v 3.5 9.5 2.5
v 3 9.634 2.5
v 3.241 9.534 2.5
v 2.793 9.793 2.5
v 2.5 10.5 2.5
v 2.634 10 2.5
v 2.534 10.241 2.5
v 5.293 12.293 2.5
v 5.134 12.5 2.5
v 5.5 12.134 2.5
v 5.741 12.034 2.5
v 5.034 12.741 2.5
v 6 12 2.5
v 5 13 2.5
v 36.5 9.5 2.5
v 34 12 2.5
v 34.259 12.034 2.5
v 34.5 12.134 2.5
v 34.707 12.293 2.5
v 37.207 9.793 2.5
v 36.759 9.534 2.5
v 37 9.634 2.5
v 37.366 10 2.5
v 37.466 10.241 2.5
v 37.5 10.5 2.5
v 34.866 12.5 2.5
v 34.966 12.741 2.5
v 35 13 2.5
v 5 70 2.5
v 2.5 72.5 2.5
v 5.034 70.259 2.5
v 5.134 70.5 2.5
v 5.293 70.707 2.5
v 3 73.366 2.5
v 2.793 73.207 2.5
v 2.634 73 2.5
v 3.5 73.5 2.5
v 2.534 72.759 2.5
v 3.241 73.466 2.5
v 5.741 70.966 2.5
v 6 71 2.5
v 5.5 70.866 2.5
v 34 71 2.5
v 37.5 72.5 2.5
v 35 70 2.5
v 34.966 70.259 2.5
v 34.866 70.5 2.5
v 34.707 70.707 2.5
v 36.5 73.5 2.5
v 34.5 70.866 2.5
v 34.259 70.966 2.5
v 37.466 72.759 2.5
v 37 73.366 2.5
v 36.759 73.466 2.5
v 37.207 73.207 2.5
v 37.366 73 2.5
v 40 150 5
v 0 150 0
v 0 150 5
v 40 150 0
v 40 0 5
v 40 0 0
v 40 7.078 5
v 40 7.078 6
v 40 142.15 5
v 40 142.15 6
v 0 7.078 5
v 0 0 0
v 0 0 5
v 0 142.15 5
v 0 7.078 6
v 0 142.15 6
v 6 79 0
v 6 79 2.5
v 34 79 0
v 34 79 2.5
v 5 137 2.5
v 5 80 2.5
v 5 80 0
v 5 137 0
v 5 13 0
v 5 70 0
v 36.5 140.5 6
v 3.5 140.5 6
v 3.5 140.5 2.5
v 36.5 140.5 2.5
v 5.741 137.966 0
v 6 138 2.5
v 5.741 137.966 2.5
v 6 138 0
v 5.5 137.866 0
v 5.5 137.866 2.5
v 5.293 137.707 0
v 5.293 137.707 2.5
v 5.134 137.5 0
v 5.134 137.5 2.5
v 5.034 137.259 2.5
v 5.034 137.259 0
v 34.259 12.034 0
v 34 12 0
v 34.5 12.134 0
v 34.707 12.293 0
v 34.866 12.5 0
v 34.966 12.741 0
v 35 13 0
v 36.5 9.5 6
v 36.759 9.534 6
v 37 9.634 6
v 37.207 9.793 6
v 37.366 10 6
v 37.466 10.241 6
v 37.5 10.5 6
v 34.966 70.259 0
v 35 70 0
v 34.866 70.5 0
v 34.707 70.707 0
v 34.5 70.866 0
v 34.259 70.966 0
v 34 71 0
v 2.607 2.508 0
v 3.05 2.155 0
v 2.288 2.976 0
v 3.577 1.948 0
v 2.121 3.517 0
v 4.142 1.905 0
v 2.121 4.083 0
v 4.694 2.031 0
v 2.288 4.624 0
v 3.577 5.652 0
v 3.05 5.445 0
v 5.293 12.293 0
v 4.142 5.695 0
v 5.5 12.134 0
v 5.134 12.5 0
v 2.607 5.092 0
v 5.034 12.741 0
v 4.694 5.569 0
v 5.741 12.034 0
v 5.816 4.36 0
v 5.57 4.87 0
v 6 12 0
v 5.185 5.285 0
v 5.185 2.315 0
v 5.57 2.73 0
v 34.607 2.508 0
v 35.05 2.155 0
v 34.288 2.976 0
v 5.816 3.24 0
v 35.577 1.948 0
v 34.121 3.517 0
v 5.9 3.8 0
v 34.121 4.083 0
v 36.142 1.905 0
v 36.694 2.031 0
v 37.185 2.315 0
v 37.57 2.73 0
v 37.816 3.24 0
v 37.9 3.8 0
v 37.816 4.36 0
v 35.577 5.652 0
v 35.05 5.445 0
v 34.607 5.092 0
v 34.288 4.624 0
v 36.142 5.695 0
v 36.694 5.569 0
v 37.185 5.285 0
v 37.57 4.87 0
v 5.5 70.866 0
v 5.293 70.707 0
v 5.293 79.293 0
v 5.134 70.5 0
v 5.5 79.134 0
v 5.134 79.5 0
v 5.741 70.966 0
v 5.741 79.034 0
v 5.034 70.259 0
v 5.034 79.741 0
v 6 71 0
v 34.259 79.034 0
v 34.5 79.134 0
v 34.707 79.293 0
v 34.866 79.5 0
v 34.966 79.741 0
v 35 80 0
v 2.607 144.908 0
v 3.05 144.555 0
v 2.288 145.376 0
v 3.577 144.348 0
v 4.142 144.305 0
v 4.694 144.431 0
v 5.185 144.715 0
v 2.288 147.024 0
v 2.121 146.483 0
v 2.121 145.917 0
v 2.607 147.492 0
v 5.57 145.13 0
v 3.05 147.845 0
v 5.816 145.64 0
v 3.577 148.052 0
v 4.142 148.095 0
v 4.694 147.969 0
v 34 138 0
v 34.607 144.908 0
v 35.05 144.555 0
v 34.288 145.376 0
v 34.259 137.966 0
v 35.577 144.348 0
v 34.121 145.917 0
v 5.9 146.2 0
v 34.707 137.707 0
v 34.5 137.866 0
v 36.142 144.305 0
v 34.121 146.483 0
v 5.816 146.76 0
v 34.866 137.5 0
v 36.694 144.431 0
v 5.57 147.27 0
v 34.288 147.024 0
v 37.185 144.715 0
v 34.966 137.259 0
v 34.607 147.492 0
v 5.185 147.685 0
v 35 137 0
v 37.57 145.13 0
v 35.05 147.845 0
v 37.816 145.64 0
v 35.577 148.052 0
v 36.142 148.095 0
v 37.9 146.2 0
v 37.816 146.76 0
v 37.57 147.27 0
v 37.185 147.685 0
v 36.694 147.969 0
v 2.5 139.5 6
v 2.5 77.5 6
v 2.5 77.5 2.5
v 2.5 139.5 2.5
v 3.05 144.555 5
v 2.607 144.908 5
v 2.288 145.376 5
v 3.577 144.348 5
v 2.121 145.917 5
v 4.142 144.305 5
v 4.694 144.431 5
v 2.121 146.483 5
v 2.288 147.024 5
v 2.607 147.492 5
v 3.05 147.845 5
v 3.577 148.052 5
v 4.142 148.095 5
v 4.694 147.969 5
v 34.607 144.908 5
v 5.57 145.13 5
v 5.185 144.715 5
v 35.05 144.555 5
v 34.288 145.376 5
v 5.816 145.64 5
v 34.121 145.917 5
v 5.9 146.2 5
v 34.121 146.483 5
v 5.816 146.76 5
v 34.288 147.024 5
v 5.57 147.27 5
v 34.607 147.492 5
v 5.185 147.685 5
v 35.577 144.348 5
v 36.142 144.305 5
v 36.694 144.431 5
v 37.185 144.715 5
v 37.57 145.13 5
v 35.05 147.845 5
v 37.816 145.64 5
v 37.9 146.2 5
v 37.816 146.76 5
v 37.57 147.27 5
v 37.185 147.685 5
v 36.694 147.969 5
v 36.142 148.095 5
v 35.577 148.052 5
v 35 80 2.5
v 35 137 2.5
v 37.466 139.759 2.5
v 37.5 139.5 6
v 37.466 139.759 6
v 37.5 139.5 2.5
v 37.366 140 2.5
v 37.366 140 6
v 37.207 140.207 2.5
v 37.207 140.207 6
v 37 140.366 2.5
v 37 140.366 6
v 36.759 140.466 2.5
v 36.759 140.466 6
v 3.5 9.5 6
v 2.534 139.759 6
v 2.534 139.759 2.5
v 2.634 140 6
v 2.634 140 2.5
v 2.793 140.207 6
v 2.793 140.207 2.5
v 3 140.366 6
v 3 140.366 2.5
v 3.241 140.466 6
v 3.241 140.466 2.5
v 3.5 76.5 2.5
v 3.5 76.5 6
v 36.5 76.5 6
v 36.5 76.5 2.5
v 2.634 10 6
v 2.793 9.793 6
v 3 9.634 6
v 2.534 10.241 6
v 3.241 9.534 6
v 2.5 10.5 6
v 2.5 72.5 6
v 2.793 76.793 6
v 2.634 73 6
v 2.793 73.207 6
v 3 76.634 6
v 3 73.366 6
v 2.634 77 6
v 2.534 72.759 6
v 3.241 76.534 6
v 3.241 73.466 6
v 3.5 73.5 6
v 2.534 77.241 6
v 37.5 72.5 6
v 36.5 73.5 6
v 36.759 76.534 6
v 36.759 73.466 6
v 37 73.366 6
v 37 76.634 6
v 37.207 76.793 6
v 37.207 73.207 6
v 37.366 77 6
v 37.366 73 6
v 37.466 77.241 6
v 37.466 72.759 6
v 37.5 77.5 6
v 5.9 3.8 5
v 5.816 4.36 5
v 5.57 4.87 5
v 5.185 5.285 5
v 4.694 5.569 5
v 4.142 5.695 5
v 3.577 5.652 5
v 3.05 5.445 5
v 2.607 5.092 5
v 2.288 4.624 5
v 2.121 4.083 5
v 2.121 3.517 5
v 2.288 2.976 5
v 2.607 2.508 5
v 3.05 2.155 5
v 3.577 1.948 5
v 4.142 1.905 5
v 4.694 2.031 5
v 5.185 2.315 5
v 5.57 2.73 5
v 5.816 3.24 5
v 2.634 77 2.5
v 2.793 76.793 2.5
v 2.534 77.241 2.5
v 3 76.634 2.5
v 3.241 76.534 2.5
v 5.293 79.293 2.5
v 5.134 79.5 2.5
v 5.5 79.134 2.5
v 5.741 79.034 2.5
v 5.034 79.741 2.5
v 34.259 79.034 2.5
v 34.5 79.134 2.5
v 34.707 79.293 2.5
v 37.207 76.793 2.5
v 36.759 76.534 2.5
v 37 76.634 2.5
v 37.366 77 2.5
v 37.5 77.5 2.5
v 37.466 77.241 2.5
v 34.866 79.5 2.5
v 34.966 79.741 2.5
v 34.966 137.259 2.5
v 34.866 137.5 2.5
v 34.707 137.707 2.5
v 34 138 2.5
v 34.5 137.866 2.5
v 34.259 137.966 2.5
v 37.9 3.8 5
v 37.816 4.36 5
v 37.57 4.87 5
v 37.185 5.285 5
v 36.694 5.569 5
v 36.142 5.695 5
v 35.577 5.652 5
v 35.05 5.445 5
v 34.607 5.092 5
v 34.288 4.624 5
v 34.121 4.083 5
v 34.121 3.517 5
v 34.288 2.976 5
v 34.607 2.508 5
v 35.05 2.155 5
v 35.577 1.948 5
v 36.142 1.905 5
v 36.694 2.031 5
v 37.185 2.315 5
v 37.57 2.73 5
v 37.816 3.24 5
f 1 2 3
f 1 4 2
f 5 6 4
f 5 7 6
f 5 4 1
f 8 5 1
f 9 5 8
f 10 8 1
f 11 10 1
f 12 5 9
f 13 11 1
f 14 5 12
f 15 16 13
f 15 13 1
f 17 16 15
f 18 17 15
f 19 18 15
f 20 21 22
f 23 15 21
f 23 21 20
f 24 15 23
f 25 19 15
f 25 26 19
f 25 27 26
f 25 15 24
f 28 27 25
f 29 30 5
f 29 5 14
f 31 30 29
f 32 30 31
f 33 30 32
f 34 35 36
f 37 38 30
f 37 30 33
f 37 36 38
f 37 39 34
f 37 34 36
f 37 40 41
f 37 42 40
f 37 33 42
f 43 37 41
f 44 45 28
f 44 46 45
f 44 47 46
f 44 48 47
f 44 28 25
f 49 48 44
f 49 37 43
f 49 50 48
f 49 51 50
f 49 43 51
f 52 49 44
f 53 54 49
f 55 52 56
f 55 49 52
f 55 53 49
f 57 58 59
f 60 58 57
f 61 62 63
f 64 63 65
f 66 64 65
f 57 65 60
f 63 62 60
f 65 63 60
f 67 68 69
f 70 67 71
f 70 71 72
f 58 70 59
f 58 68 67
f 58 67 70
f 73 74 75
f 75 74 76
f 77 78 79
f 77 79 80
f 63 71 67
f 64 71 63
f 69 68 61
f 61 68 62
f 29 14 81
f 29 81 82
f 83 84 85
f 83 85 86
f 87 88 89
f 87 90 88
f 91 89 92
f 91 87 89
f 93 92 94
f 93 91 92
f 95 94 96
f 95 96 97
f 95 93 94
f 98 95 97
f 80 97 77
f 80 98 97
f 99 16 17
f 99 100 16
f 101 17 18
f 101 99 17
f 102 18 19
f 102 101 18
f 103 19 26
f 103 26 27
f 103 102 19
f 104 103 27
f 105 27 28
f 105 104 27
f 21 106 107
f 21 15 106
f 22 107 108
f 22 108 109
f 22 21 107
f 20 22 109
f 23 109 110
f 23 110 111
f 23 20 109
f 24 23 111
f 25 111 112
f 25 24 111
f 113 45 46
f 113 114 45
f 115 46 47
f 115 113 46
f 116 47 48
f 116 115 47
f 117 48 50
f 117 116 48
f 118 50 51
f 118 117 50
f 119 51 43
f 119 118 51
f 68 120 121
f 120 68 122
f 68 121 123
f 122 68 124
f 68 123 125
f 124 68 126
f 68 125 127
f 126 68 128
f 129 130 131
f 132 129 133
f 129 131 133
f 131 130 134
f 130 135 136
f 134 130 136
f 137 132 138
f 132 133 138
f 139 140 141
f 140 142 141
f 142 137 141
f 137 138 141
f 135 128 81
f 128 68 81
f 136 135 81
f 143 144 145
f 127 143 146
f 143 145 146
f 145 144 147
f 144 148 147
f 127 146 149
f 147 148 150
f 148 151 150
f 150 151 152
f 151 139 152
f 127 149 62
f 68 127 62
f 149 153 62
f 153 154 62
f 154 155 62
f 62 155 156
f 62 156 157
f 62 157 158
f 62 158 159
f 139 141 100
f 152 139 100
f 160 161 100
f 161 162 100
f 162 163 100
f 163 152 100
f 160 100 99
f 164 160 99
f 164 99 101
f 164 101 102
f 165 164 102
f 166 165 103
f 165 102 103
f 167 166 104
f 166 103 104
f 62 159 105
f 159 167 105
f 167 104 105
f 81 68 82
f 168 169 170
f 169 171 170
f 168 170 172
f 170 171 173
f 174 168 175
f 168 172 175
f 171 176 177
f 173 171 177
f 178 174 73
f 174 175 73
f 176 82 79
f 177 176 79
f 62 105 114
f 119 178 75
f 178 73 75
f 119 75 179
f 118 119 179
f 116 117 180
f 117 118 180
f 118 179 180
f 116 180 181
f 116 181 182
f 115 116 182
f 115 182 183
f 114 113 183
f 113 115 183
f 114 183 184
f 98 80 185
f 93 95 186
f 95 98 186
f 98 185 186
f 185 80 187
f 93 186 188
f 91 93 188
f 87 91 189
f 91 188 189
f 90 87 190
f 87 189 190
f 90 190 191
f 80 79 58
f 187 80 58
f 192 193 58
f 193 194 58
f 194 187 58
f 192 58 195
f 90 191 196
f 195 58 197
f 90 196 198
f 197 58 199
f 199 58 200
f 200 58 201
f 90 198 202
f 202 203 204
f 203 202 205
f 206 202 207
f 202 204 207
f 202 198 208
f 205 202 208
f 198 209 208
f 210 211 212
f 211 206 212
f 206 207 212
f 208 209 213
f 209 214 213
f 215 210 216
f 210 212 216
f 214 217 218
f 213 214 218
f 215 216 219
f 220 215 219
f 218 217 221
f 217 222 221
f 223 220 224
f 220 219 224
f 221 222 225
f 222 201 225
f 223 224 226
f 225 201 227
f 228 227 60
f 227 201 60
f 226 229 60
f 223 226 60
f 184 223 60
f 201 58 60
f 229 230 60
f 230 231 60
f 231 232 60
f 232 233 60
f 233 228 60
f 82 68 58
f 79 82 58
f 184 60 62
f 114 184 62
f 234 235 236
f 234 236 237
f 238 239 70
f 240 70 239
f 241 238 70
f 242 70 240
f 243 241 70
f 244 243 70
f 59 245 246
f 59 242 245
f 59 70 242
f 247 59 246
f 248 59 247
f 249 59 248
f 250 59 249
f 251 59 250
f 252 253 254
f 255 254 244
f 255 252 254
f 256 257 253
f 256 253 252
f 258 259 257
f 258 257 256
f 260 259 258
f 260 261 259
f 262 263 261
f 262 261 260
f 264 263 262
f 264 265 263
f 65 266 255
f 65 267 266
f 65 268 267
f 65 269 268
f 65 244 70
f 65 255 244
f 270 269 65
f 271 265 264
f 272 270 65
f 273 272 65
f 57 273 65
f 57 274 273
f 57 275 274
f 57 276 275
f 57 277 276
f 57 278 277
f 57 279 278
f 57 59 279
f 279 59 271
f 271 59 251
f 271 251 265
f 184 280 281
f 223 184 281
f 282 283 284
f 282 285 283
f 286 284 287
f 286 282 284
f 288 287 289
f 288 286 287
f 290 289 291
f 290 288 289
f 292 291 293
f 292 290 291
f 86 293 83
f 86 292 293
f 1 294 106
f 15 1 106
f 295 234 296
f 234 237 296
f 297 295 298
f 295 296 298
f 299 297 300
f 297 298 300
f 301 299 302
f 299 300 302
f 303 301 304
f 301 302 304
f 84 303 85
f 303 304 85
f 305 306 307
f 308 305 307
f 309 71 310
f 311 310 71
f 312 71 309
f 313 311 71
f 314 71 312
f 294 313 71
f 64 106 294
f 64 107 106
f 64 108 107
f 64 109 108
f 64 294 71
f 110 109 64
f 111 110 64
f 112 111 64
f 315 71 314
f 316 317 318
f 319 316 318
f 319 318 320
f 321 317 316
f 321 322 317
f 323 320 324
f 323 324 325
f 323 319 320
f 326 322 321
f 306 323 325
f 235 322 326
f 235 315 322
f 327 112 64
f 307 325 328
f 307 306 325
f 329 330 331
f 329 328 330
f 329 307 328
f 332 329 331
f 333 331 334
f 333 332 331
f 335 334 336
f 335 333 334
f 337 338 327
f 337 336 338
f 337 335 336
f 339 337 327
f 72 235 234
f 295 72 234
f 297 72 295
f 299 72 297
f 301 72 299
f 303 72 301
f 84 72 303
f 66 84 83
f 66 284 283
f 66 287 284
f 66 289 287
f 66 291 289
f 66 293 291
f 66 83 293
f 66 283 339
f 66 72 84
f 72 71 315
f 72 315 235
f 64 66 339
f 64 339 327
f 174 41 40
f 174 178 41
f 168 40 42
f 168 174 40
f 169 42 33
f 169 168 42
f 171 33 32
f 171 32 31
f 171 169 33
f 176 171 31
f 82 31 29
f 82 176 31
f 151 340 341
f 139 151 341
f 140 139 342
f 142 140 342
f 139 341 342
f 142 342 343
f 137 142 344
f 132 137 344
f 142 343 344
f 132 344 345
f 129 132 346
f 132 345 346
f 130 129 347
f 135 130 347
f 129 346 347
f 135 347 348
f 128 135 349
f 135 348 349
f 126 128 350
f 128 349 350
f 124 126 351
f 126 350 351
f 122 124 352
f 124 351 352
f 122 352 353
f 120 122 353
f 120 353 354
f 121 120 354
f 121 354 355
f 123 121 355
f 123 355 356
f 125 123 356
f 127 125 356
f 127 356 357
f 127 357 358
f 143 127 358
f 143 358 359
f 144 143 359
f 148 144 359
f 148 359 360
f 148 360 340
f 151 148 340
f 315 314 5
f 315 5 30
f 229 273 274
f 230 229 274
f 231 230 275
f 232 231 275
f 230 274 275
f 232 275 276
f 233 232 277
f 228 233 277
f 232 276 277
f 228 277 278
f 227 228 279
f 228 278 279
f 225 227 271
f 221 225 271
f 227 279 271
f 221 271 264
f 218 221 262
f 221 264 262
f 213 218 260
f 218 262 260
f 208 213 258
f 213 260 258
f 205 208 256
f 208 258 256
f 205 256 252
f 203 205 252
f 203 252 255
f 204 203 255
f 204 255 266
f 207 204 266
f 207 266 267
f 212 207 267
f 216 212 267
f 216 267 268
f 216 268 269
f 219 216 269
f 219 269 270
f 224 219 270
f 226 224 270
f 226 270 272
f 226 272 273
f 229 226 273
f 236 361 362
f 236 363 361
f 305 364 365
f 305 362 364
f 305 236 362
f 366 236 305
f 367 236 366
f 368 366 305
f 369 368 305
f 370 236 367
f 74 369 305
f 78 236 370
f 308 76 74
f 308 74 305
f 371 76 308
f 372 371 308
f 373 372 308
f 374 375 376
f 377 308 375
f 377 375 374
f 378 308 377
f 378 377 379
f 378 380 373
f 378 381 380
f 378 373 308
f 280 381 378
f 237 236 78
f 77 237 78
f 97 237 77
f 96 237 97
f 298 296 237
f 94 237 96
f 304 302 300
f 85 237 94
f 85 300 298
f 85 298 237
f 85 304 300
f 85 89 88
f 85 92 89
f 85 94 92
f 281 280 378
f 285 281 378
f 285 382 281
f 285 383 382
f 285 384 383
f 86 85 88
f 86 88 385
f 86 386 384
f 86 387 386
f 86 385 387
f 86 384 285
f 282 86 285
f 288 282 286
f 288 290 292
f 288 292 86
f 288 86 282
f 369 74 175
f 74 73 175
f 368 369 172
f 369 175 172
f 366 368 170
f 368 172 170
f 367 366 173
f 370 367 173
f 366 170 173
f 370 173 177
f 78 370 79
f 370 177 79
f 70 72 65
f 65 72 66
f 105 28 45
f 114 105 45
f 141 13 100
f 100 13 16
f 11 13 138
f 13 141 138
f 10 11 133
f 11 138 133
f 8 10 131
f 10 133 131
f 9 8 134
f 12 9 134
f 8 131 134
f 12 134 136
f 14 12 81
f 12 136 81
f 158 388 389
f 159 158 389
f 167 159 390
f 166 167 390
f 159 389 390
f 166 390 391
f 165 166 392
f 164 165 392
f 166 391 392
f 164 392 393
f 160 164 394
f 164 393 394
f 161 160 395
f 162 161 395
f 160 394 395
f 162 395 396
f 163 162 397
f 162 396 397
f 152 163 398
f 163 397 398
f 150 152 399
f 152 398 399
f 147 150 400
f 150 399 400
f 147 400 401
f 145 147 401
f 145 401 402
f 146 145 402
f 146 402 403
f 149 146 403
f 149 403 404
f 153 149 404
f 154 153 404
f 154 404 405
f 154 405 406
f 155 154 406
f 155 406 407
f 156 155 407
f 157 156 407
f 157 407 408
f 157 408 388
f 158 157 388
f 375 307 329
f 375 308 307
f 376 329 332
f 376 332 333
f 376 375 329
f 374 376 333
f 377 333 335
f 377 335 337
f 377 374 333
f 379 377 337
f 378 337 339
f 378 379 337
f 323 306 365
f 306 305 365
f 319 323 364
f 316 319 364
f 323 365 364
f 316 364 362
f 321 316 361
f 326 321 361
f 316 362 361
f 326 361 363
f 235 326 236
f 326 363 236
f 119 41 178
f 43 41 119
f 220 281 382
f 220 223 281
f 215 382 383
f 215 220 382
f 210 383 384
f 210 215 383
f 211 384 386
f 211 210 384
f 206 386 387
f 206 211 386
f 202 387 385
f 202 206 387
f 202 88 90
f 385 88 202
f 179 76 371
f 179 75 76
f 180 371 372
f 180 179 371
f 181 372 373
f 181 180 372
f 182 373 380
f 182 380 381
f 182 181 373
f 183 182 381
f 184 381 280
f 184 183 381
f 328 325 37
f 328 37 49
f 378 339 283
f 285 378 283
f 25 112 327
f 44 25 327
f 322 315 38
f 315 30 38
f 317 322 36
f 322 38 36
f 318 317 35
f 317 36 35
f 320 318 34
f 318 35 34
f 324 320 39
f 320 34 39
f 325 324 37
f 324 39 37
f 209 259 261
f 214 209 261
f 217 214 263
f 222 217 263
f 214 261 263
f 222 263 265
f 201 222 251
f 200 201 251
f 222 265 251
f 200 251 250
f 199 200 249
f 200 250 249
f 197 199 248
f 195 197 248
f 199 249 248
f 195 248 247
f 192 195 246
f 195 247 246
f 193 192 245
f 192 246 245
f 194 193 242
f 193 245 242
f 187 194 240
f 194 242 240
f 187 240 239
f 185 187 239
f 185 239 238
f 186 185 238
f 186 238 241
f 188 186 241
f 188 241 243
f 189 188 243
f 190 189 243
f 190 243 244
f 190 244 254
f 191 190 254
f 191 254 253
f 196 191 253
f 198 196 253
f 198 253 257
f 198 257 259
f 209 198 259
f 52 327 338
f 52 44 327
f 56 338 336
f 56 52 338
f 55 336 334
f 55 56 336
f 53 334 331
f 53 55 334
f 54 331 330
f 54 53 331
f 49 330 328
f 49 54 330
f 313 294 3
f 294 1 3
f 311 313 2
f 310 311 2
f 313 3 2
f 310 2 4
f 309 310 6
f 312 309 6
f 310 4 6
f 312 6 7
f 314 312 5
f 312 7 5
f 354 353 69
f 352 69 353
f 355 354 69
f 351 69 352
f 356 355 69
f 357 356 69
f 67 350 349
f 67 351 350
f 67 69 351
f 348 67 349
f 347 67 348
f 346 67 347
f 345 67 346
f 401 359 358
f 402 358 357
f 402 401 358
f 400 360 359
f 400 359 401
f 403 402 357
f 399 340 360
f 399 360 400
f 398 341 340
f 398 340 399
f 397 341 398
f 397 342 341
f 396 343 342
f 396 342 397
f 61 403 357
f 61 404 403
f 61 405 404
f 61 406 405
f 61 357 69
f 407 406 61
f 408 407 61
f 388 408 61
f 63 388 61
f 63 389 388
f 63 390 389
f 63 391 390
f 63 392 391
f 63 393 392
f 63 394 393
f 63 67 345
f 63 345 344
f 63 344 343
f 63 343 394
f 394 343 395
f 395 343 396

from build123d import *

# Parameters (mm, degrees)
SKETCH_1_W          = 40
SKETCH_1_H          = 150
EXTRUDE_1_DEPTH     = 6
SKETCH_2_R          = 1.9
CUT_EXTRUDE_1_DEPTH = 156.357651888
SKETCH_3_W          = 30
SKETCH_3_H          = 59
CUT_EXTRUDE_2_DEPTH = 156.357651888
SKETCH_4_W          = 35
SKETCH_4_H          = 64
CUT_EXTRUDE_3_DEPTH = 3.5
SKETCH_5_W          = 40
SKETCH_5_H          = 7.078158815
SKETCH_5_H_2        = 7.85
CUT_EXTRUDE_4_DEPTH = 1
FILLET_1_R          = 1


with BuildPart() as part:
    # ｽｹｯﾁ1 → ﾎﾞｽ - 押し出し1 (new body)
    with BuildSketch(Plane.XY):
        with Locations((20, 75)):
            Rectangle(SKETCH_1_W, SKETCH_1_H)
    extrude(amount=EXTRUDE_1_DEPTH)

    # ｽｹｯﾁ2 → ｶｯﾄ - 押し出し1 (cut, through all)
    with BuildSketch(Plane.XY.offset(6)):
        with Locations((36, 146.2)):
            Circle(SKETCH_2_R)
        with Locations((4, 146.2)):
            Circle(SKETCH_2_R)
        with Locations((4, 3.8)):
            Circle(SKETCH_2_R)
        with Locations((36, 3.8)):
            Circle(SKETCH_2_R)
    extrude(amount=-CUT_EXTRUDE_1_DEPTH, mode=Mode.SUBTRACT)

    # ｽｹｯﾁ3 → ｶｯﾄ - 押し出し2 (cut, through all)
    with BuildSketch(Plane.XY.offset(6)):
        with Locations((20, 108.5)):
            Rectangle(SKETCH_3_W, SKETCH_3_H)
        with Locations((20, 41.5)):
            Rectangle(SKETCH_3_W, SKETCH_3_H)
    extrude(amount=-CUT_EXTRUDE_2_DEPTH, mode=Mode.SUBTRACT)

    # ｽｹｯﾁ4 → ｶｯﾄ - 押し出し3 (cut)
    with BuildSketch(Plane.XY.offset(6)):
        with Locations((20, 108.5)):
            Rectangle(SKETCH_4_W, SKETCH_4_H)
        with Locations((20, 41.5)):
            Rectangle(SKETCH_4_W, SKETCH_4_H)
    extrude(amount=-CUT_EXTRUDE_3_DEPTH, mode=Mode.SUBTRACT)

    # ｽｹｯﾁ5 → ｶｯﾄ - 押し出し4 (cut)
    with BuildSketch(Plane.XY.offset(6)):
        with Locations((20, 3.539079408)):
            Rectangle(SKETCH_5_W, SKETCH_5_H)
        with Locations((20, 146.075)):
            Rectangle(SKETCH_5_W, SKETCH_5_H_2)
    extrude(amount=-CUT_EXTRUDE_4_DEPTH, mode=Mode.SUBTRACT)

    # ﾌｨﾚｯﾄ1
    fillet_1_edges = [part.edges().sort_by_distance(p)[0] for p in [
        (35, 138, 1.25),
        (35, 79, 1.25),
        (5, 79, 1.25),
        (5, 138, 1.25),
        (35, 71, 1.25),
        (35, 12, 1.25),
        (5, 12, 1.25),
        (5, 71, 1.25),
        (2.5, 76.5, 4.25),
        (2.5, 140.5, 4.25),
        (37.5, 140.5, 4.25),
        (37.5, 76.5, 4.25),
        (2.5, 9.5, 4.25),
        (2.5, 73.5, 4.25),
        (37.5, 73.5, 4.25),
        (37.5, 9.5, 4.25),
    ]]
    fillet(fillet_1_edges, radius=FILLET_1_R)


solid = part.part
